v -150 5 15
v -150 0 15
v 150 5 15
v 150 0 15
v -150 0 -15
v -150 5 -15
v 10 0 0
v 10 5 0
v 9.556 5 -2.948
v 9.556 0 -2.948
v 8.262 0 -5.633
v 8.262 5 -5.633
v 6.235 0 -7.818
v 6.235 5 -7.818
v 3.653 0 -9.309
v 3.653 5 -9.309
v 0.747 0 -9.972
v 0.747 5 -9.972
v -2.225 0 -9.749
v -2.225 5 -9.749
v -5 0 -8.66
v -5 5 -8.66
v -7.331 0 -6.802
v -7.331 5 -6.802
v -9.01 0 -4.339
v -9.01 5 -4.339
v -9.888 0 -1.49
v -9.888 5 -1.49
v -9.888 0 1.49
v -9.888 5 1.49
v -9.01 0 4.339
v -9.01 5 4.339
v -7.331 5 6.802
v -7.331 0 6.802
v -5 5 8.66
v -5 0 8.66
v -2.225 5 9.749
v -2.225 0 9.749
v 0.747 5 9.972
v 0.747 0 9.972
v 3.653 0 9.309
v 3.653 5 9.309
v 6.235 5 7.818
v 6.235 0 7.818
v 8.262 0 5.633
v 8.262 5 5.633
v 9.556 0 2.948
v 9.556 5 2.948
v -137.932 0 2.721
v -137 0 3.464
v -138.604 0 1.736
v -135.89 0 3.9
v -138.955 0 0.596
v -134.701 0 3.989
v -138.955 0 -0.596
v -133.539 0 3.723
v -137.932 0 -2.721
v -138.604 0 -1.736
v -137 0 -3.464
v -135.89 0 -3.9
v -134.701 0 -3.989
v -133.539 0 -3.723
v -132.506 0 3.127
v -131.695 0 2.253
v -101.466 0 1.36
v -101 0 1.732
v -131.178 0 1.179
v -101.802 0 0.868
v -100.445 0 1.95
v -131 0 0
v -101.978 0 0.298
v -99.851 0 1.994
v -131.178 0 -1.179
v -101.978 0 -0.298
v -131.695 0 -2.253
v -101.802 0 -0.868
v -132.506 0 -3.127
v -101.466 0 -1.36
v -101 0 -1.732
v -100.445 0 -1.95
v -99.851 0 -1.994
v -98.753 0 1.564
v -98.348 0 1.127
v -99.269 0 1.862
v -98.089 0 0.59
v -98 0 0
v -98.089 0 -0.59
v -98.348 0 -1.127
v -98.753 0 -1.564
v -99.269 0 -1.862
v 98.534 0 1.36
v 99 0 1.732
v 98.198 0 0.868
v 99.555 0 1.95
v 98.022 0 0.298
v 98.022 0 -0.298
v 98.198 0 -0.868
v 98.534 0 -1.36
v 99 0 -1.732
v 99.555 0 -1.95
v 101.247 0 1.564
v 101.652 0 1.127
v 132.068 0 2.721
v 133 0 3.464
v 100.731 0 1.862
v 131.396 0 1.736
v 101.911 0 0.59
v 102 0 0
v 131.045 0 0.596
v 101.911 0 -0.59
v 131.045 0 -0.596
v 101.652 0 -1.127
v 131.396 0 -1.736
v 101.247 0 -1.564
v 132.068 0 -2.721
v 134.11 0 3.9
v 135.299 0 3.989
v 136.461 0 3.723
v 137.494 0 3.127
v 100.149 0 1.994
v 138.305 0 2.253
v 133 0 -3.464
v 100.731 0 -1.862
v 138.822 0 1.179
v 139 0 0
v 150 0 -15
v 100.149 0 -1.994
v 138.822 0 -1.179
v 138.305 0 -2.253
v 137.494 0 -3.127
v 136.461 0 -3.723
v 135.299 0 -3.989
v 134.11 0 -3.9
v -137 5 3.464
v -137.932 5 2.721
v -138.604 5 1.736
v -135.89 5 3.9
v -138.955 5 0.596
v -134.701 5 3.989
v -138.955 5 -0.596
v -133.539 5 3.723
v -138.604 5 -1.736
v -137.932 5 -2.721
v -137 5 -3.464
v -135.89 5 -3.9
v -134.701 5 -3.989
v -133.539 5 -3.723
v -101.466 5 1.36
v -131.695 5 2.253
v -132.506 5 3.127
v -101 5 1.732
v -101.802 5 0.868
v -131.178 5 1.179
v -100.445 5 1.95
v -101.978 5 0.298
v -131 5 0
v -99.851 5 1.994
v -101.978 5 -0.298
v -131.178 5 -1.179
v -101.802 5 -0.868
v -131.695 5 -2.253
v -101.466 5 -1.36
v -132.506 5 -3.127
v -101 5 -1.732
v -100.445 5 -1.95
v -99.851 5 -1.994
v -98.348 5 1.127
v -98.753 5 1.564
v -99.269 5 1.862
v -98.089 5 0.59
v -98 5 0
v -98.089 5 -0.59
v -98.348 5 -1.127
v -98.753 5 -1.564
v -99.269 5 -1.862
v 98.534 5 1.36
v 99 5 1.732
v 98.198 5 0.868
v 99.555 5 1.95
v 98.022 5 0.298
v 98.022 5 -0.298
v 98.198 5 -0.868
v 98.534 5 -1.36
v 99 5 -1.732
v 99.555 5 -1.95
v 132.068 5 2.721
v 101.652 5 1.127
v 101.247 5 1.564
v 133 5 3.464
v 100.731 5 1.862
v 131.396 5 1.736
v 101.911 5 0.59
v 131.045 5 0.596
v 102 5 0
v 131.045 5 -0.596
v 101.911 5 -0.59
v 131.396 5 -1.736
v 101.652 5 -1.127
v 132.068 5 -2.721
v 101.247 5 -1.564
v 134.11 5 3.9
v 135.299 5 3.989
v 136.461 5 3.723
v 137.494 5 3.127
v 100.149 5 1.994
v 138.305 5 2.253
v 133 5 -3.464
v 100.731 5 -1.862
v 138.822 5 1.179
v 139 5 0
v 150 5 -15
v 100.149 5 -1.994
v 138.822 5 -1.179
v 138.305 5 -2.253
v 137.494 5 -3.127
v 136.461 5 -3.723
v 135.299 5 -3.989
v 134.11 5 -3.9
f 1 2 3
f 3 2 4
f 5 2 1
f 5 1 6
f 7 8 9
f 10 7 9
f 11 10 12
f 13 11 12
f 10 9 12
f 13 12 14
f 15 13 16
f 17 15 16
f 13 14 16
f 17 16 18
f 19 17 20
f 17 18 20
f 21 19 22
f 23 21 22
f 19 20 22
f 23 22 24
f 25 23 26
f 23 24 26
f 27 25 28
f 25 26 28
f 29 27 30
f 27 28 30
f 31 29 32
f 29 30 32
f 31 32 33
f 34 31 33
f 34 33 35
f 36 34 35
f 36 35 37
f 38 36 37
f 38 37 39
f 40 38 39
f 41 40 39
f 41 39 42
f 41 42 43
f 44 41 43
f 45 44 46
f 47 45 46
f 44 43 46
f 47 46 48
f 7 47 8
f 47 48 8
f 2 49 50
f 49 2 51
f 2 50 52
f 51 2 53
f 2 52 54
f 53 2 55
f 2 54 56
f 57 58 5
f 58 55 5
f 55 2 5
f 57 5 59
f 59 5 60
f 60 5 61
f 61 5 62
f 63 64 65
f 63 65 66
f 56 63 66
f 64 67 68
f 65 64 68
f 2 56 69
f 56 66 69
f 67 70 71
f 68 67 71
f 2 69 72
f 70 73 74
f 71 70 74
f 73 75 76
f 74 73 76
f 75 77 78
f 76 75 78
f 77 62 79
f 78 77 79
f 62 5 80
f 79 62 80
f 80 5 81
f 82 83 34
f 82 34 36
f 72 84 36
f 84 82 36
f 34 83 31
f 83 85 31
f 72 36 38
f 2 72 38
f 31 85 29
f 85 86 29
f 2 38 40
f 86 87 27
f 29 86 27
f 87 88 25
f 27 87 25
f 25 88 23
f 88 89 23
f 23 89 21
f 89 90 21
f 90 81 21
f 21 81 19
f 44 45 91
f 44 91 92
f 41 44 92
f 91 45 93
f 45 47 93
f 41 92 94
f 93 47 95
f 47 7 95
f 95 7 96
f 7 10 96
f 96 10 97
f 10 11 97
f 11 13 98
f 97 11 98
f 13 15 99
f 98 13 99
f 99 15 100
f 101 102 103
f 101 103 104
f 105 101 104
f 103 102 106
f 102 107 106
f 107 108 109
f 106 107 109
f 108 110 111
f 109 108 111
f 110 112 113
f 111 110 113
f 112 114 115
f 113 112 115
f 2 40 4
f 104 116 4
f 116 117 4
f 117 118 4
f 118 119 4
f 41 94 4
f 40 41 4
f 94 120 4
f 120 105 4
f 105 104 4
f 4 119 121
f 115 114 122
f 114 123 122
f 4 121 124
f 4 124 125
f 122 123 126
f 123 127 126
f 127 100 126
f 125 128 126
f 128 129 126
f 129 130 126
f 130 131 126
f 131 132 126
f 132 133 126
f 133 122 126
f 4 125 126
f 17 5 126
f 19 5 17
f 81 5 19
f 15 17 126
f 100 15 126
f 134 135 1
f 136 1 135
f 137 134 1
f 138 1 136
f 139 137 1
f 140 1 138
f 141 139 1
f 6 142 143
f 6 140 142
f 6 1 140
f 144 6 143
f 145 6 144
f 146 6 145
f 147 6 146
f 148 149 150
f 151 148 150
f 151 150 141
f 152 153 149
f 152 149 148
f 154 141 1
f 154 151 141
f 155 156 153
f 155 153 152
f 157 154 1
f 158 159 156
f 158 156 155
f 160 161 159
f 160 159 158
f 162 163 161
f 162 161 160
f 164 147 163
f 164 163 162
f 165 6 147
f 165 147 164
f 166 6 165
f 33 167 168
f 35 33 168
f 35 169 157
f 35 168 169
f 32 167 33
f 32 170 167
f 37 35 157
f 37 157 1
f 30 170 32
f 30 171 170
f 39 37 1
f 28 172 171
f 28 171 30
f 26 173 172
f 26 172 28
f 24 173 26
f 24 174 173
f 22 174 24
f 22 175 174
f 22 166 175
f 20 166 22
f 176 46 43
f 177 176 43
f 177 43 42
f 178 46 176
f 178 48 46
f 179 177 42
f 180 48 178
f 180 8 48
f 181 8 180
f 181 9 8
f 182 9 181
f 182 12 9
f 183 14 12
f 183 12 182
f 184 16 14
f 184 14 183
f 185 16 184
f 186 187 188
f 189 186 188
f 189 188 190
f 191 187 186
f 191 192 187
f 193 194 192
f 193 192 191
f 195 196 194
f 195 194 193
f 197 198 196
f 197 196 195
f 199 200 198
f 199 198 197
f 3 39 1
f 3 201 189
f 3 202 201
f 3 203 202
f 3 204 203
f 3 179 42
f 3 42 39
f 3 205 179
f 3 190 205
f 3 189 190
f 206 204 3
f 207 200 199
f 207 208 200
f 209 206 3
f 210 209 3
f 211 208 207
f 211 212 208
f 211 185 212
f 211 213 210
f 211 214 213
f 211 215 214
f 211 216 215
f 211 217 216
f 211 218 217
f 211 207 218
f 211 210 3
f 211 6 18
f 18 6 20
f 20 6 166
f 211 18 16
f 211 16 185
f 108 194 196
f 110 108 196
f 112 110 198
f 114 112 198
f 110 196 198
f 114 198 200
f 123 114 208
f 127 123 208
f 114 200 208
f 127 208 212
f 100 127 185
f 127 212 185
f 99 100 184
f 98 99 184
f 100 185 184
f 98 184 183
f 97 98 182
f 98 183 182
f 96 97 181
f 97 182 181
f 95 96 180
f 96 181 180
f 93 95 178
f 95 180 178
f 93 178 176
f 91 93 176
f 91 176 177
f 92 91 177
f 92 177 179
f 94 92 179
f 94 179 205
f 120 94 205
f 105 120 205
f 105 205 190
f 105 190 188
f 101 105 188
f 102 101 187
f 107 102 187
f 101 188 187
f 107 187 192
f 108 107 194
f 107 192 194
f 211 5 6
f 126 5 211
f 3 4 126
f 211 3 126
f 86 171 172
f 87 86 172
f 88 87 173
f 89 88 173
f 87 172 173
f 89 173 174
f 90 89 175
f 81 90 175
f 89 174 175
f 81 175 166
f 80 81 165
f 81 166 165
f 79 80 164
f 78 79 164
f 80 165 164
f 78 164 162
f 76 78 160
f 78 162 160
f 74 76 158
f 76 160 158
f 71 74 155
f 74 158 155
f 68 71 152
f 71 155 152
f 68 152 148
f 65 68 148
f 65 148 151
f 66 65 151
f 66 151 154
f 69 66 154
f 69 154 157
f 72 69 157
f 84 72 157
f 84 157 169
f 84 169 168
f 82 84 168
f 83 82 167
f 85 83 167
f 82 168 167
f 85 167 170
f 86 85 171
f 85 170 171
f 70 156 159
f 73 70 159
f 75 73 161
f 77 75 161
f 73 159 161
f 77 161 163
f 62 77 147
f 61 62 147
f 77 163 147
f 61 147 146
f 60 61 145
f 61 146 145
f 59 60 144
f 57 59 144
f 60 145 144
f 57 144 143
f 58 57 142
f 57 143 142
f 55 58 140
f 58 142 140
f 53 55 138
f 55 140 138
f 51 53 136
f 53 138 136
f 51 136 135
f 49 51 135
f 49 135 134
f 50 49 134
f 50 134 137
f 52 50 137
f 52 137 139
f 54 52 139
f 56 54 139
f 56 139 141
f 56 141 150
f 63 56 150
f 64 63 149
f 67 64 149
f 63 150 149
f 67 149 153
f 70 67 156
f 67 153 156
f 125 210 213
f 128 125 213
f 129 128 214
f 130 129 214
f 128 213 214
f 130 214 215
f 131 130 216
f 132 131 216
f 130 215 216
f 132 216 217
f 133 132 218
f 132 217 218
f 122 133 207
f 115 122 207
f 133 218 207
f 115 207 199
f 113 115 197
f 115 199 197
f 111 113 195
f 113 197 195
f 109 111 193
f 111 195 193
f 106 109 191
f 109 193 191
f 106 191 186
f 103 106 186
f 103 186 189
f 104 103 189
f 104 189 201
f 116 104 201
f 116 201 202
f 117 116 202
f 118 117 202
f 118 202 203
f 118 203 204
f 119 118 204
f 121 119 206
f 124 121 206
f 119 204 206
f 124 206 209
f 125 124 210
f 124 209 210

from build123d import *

# Parameters (mm, degrees)
SKETCH2_W           = 300
SKETCH2_H           = 30
BOSS_EXTRUDE1_DEPTH = 5
SKETCH3_R           = 4
SKETCH3_R_2         = 10
CUT_EXTRUDE1_DEPTH  = 5
SKETCH5_R           = 2
CUT_EXTRUDE2_DEPTH  = 5


with BuildPart() as part:
    # Sketch2 → Boss-Extrude1 (new body)
    with BuildSketch(Plane(origin=(0, 0, 0), x_dir=(1, 0, 0), z_dir=(0, 1, 0))):
        Rectangle(SKETCH2_W, SKETCH2_H)
    extrude(amount=BOSS_EXTRUDE1_DEPTH)

    # Sketch3 → Cut-Extrude1 (cut)
    with BuildSketch(Plane(origin=(0, 5, 0), x_dir=(1, 0, 0), z_dir=(0, 1, 0))):
        with Locations((-135, 0)):
            Circle(SKETCH3_R)
        Circle(SKETCH3_R_2)
        with Locations((135, 0)):
            Circle(SKETCH3_R)
    extrude(amount=-CUT_EXTRUDE1_DEPTH, mode=Mode.SUBTRACT)

    # Sketch5 → Cut-Extrude2 (cut)
    with BuildSketch(Plane(origin=(0, 5, 0), x_dir=(1, 0, 0), z_dir=(0, 1, 0))):
        with Locations((100, 0)):
            Circle(SKETCH5_R)
        with Locations((-100, 0)):
            Circle(SKETCH5_R)
    extrude(amount=-CUT_EXTRUDE2_DEPTH, mode=Mode.SUBTRACT)


solid = part.part
